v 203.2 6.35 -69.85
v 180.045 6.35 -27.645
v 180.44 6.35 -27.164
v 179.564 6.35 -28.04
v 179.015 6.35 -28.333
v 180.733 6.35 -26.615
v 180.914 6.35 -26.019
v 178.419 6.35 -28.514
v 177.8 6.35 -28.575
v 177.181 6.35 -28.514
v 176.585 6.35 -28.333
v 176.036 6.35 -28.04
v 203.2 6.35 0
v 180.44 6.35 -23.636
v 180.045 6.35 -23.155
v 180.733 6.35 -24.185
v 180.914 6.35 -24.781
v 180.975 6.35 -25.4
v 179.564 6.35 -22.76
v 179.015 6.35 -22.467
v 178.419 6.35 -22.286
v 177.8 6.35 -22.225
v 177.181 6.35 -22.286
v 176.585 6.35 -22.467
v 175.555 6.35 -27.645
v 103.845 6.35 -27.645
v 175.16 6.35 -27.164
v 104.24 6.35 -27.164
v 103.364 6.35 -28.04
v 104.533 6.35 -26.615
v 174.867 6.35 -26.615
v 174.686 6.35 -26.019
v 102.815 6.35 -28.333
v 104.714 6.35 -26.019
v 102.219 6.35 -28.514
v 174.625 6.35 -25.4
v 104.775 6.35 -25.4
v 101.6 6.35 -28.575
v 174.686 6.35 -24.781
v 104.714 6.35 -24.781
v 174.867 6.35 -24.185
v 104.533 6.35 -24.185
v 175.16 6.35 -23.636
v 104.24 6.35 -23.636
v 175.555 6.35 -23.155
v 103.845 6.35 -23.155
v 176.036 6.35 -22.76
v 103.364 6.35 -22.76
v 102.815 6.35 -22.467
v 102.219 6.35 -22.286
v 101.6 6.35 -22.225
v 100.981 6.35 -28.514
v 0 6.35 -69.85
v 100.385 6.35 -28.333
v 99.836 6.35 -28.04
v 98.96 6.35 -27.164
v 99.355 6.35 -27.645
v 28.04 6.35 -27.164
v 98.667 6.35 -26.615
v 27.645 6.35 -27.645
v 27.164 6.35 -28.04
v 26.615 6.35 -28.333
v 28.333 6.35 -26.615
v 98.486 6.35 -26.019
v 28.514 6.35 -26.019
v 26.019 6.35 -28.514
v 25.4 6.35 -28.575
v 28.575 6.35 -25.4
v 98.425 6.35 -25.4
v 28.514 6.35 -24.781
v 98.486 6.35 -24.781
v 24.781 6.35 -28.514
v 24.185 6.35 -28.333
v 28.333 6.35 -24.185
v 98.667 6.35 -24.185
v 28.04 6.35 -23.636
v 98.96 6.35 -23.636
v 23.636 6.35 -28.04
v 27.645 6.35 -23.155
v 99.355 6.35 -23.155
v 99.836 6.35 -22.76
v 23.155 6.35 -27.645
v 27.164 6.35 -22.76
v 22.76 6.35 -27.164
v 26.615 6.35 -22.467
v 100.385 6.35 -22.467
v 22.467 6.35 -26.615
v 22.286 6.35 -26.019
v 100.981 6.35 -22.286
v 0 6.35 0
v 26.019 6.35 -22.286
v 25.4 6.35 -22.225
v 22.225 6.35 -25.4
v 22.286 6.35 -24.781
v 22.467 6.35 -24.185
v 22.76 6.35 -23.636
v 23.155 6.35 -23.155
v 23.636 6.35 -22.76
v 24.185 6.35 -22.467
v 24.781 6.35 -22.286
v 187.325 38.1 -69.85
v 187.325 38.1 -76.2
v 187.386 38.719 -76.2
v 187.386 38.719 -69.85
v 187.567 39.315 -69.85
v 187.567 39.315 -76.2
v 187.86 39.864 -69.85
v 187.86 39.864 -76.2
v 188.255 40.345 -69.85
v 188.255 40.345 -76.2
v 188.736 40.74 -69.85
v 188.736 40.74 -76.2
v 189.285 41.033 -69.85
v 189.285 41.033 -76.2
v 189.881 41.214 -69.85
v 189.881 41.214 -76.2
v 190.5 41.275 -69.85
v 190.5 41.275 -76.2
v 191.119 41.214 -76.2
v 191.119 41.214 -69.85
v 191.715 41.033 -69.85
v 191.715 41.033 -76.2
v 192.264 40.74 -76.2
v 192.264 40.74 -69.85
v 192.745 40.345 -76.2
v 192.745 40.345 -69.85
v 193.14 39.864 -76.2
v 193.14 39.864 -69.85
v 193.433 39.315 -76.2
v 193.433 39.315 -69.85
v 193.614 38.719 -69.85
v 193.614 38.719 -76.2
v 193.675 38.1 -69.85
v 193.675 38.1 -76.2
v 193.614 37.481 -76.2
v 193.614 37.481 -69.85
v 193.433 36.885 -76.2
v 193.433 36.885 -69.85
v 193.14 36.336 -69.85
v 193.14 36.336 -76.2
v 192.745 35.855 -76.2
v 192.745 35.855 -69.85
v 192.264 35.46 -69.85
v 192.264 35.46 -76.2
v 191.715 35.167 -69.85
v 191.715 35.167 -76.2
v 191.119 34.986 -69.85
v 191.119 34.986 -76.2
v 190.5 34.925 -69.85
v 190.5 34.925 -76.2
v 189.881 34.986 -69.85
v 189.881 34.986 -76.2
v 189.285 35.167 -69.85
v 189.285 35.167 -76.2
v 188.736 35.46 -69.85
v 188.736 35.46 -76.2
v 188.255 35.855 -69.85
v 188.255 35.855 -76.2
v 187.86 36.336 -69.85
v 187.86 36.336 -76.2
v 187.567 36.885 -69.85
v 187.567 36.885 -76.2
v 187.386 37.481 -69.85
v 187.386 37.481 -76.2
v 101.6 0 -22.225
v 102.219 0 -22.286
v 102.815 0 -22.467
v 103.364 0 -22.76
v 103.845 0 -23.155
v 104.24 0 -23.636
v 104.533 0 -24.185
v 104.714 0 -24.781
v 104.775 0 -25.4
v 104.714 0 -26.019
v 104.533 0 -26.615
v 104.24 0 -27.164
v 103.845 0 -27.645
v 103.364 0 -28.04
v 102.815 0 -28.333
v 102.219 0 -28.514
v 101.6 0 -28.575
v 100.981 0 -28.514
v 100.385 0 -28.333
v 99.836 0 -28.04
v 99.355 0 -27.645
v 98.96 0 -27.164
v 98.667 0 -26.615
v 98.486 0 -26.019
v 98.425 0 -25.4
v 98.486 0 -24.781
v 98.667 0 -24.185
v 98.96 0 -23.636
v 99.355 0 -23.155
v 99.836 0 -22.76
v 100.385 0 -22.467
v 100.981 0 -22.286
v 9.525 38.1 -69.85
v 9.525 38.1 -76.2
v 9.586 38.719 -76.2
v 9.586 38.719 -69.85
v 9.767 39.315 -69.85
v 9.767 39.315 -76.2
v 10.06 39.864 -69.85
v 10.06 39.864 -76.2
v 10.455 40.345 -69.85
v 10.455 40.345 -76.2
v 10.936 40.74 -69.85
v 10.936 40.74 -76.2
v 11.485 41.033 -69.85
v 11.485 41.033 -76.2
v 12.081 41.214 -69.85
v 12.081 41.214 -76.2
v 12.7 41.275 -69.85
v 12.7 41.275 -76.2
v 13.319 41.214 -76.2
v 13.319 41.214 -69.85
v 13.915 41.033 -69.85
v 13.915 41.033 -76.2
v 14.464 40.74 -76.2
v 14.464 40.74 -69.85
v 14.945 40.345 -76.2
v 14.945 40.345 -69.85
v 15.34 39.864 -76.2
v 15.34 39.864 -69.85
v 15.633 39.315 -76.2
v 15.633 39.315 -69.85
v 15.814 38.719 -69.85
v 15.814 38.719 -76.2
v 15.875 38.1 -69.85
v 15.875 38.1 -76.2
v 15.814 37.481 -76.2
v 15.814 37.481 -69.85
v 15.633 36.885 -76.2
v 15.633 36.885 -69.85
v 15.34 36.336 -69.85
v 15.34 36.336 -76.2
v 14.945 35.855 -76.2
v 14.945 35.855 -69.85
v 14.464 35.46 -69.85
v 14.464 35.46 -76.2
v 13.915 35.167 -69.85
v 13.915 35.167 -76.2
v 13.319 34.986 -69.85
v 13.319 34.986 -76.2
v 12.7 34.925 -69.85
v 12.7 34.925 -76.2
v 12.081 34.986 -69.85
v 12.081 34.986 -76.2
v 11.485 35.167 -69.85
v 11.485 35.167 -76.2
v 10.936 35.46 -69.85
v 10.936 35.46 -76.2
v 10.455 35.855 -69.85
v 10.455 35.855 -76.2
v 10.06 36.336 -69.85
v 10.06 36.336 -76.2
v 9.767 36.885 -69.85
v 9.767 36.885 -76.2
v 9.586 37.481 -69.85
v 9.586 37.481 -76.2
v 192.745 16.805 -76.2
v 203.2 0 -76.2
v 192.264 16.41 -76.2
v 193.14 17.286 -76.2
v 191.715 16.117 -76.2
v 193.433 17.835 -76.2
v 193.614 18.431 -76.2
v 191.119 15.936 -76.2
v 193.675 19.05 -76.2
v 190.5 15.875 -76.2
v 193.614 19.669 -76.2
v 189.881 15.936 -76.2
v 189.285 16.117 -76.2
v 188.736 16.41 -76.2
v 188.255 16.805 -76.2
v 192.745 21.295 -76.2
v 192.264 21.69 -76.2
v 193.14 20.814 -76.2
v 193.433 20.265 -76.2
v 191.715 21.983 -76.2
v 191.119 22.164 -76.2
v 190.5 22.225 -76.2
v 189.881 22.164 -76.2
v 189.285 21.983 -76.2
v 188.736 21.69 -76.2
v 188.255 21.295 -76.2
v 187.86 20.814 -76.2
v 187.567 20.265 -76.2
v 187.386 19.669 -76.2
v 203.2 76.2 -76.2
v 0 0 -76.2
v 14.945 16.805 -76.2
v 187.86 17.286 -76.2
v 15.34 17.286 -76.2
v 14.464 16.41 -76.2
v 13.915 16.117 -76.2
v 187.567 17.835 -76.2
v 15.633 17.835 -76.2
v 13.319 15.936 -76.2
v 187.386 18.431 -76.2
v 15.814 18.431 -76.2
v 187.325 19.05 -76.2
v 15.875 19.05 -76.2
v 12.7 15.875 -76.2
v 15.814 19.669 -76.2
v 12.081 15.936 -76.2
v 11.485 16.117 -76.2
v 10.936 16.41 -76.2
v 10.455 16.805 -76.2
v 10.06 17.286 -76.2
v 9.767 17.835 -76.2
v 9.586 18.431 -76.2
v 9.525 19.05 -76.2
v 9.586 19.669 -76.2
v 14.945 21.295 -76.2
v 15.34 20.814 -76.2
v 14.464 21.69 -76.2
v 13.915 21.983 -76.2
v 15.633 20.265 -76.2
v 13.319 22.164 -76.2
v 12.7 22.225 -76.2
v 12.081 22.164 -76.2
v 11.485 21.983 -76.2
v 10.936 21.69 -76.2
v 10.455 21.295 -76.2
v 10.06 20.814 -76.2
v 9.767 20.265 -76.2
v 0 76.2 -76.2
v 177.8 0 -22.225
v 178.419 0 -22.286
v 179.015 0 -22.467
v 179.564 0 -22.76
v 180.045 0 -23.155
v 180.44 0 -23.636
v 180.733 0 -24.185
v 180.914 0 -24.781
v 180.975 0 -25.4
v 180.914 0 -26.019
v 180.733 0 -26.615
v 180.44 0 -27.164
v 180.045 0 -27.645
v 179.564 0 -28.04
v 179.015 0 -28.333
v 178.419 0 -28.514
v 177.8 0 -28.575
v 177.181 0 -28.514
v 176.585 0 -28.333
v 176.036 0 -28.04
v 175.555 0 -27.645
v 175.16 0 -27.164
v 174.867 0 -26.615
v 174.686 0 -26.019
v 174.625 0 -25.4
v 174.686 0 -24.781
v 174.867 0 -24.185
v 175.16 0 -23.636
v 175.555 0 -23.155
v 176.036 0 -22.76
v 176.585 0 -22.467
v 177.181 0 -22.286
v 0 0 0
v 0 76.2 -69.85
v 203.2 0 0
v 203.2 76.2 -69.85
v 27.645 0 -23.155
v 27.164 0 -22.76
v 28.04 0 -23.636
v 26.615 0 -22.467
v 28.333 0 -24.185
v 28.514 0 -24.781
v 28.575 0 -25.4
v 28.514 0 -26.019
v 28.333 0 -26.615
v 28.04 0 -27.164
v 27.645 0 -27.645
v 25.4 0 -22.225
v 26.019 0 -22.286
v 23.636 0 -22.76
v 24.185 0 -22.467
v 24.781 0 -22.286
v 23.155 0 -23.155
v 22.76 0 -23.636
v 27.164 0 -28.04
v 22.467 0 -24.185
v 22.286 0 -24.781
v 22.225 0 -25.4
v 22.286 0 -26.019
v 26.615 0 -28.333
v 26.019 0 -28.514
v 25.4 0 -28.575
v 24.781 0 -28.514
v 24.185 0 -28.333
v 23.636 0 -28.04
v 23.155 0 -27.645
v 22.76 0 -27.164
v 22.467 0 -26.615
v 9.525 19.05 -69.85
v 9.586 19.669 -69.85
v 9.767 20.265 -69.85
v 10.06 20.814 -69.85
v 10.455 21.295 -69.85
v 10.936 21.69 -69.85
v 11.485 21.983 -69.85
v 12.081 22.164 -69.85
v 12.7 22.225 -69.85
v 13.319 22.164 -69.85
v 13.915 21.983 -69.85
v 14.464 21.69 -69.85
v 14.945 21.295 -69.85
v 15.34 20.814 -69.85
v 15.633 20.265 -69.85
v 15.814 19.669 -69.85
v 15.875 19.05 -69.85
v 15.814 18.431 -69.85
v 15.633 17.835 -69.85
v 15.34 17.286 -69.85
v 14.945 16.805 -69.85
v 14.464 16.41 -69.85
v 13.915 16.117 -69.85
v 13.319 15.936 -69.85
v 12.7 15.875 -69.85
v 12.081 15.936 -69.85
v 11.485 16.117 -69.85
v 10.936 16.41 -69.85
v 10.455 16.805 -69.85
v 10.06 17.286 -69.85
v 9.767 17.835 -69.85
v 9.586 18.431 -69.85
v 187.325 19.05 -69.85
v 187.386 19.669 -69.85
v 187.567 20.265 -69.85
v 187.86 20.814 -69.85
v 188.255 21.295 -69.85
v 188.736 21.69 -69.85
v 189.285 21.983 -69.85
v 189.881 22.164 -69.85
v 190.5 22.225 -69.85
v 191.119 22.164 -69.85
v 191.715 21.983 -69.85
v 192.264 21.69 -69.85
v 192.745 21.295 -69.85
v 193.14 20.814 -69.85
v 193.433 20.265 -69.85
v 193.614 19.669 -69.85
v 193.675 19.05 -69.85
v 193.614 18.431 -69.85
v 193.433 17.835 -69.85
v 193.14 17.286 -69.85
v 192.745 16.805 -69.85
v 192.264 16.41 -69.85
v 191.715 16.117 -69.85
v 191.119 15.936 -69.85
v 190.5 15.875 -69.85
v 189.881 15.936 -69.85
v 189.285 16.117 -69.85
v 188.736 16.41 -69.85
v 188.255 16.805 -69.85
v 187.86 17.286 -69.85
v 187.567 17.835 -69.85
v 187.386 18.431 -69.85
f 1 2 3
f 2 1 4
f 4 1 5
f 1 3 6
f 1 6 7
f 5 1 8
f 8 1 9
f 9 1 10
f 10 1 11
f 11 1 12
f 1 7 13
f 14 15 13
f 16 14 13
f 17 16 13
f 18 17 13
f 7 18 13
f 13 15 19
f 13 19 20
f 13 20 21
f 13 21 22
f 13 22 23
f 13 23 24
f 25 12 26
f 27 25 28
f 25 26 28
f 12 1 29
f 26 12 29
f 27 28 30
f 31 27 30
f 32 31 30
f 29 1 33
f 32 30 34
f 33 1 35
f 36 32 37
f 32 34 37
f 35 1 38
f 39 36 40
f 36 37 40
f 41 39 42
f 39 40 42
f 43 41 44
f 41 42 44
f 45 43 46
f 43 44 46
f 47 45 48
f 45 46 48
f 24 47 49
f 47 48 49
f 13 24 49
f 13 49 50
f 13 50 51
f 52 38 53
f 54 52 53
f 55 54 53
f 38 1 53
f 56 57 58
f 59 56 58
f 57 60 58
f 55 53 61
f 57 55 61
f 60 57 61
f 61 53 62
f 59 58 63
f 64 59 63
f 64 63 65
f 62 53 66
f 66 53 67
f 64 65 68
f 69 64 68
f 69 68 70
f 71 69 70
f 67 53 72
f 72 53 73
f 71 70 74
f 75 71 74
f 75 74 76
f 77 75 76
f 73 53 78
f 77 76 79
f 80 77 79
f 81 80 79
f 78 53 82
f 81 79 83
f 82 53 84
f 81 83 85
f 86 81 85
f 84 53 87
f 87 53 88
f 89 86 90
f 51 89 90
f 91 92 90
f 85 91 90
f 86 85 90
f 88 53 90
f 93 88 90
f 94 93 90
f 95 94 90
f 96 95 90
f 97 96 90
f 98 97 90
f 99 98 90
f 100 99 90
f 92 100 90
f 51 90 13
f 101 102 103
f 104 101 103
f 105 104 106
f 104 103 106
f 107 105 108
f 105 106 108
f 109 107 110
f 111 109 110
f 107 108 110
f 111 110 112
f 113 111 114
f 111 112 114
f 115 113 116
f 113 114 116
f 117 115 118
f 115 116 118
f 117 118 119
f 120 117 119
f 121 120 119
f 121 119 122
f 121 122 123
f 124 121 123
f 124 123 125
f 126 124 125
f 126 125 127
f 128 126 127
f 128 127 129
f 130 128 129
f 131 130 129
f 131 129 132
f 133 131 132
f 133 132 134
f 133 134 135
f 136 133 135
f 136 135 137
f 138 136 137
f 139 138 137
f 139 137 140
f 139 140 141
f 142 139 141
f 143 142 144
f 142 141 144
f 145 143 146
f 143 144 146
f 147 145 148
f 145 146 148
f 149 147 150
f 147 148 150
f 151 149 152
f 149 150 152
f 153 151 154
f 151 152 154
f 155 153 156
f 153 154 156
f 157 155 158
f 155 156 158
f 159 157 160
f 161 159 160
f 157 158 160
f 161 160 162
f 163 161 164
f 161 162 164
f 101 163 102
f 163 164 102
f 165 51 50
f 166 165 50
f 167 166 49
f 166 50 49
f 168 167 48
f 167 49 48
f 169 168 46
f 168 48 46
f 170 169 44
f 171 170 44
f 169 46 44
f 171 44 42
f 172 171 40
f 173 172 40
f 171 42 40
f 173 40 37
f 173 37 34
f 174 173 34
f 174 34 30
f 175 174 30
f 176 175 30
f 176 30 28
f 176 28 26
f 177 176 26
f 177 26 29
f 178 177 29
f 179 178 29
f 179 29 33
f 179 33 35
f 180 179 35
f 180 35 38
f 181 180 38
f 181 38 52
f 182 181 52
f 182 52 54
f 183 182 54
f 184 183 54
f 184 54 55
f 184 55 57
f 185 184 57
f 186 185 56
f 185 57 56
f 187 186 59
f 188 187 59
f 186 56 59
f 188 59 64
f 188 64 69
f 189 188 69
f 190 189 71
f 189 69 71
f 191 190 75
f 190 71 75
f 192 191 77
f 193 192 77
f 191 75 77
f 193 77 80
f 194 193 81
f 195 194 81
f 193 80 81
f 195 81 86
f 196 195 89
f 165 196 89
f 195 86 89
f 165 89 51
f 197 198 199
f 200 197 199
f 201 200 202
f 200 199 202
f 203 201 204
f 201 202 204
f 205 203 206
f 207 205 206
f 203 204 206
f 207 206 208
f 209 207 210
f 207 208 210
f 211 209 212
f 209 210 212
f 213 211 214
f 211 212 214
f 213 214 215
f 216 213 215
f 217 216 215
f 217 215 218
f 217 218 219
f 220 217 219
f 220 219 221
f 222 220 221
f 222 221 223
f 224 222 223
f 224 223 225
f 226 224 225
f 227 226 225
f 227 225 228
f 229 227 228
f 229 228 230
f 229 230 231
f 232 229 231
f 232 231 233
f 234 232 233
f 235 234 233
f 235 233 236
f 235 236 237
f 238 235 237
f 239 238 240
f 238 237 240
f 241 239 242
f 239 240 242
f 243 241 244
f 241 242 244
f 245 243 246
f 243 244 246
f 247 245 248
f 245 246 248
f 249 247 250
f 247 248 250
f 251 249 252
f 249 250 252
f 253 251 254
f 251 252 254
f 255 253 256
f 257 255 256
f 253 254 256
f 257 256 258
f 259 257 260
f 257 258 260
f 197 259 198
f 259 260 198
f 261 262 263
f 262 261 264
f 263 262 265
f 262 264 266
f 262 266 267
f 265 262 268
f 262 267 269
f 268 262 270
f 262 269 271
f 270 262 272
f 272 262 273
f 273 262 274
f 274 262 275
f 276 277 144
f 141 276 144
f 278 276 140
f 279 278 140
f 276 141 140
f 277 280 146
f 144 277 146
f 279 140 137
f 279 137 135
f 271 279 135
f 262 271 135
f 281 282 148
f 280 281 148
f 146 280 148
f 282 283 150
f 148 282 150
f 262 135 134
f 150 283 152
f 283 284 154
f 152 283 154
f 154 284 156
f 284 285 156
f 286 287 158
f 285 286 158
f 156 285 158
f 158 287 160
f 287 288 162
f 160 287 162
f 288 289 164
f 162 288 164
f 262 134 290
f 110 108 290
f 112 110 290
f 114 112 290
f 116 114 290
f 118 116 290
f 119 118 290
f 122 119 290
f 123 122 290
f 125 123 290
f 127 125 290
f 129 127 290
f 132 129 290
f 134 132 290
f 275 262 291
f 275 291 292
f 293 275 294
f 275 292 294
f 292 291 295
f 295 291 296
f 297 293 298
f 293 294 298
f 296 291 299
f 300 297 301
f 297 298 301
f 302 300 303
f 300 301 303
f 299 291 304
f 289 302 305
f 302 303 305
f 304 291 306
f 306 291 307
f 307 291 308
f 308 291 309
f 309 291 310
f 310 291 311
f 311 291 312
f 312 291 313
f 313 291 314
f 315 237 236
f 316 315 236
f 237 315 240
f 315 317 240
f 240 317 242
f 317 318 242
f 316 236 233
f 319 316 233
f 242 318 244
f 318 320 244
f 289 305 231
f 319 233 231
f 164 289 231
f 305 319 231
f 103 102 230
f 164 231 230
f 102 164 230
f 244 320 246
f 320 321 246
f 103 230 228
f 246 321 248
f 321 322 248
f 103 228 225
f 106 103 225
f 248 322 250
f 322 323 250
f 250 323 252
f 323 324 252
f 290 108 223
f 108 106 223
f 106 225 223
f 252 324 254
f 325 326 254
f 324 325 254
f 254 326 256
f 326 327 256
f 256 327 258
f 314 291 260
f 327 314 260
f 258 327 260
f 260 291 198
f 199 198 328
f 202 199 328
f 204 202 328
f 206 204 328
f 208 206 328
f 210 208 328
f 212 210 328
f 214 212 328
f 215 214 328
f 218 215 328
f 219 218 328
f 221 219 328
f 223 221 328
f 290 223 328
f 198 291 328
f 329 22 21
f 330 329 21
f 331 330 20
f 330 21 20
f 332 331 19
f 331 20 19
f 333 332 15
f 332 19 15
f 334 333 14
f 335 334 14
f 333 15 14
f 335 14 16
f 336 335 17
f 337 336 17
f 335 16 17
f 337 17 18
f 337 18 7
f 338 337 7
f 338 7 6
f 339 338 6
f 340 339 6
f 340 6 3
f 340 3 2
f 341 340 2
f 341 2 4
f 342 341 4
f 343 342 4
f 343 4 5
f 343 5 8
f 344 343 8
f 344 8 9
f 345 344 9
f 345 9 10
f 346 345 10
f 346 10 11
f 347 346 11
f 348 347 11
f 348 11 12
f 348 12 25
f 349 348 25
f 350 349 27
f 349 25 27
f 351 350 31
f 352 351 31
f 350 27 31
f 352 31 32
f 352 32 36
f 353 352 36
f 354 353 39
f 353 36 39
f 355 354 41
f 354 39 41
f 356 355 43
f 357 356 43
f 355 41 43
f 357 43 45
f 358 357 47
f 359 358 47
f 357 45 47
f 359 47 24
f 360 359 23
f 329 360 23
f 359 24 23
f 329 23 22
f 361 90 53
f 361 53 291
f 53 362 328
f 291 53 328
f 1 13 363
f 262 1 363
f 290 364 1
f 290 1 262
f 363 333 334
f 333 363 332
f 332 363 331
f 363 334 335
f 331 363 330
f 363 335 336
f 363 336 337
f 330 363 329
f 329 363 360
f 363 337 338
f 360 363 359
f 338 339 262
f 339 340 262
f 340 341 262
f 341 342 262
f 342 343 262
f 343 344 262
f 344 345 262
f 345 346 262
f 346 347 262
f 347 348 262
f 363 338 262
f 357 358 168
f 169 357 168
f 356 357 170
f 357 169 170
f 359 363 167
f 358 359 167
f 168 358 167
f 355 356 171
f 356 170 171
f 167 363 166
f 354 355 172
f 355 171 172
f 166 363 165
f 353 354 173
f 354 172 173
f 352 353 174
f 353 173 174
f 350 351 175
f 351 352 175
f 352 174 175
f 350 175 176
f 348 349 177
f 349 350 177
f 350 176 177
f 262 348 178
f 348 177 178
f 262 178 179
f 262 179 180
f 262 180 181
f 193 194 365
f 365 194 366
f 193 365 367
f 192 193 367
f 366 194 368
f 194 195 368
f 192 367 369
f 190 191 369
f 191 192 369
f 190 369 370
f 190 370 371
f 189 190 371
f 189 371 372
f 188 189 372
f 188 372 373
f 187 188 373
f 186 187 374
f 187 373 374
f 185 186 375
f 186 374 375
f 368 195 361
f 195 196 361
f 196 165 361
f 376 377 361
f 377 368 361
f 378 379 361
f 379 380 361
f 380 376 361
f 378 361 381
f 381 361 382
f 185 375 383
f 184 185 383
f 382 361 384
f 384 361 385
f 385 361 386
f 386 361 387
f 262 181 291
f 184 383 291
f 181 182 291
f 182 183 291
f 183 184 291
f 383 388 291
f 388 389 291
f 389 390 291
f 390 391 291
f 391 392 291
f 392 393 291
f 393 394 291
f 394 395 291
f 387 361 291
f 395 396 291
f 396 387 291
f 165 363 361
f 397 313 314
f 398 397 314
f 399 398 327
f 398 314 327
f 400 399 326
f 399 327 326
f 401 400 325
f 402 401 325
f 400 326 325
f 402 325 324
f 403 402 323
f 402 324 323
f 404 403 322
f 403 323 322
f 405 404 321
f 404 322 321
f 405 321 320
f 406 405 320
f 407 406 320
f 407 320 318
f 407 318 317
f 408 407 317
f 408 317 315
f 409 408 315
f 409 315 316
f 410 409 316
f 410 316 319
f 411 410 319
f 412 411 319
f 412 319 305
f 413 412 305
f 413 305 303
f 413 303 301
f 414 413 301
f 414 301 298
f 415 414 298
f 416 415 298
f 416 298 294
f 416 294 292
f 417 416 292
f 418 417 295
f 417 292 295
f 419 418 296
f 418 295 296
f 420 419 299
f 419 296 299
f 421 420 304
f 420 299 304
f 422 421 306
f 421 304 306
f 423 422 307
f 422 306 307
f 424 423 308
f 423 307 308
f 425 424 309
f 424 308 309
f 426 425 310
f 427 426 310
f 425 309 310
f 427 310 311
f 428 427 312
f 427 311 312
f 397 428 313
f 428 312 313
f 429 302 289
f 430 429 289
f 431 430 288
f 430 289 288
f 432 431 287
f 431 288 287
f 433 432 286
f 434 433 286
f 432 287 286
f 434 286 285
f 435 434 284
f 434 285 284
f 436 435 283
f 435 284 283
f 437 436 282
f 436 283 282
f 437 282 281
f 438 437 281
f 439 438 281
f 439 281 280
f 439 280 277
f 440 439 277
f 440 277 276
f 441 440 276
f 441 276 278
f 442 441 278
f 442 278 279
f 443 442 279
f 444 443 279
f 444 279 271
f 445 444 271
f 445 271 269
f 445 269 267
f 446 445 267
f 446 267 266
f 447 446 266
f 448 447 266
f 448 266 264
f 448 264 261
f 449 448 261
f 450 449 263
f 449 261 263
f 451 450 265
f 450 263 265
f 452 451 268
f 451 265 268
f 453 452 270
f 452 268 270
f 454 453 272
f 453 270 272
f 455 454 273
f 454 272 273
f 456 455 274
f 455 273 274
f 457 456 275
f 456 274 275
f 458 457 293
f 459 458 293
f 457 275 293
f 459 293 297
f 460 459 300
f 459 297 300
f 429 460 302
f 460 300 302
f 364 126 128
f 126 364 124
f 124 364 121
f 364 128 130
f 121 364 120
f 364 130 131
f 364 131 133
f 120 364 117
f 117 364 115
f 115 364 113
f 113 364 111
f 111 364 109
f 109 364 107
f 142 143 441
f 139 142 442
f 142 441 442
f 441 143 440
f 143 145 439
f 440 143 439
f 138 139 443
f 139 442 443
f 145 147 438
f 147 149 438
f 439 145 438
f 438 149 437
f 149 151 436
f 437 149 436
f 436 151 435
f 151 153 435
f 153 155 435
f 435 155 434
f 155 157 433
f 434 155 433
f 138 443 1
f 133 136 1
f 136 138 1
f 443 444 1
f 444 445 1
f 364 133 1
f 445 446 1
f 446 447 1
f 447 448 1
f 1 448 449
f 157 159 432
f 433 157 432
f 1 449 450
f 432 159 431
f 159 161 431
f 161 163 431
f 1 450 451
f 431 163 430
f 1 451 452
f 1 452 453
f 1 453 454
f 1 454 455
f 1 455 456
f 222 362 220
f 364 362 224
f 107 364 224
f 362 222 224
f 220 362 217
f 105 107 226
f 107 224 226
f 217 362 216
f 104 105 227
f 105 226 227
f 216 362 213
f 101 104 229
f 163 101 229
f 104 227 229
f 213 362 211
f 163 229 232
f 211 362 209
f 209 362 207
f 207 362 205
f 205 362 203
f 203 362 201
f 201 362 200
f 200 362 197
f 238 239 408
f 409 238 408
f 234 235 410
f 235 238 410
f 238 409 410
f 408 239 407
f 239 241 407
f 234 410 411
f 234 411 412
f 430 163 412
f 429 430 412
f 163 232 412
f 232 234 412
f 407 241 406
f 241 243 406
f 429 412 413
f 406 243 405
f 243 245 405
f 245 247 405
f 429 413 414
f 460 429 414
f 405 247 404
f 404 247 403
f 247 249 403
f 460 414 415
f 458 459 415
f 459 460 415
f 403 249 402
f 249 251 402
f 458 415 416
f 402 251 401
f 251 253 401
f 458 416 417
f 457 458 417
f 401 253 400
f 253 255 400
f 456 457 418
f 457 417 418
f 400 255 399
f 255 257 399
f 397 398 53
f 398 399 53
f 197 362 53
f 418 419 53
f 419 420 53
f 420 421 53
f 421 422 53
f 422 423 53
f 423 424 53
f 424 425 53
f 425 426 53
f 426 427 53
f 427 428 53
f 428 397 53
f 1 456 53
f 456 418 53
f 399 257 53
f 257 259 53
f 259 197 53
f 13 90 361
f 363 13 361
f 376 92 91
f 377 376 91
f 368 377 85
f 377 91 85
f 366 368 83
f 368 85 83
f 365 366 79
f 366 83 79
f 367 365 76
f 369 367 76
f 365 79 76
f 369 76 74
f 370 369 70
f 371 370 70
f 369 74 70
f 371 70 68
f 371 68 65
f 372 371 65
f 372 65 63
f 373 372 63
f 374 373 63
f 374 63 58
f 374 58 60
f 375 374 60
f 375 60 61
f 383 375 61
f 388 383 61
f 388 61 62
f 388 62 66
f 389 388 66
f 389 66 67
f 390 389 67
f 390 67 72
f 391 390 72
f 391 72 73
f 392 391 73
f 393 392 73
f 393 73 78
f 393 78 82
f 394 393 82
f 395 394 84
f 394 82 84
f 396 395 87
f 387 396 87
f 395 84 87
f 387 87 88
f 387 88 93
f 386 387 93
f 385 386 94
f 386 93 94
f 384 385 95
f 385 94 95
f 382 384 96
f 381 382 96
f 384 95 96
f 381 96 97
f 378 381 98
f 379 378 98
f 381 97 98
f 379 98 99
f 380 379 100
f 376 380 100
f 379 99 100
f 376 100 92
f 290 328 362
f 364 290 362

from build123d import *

# Parameters (mm, degrees)
BOSS_EXTRUDE2_DEPTH = 203.2
SKETCH4_R           = 3.175
CUT_EXTRUDE1_DEPTH  = 71.628
SKETCH5_R           = 3.175
CUT_EXTRUDE2_DEPTH  = 244.602


with BuildPart() as part:
    # Sketch2 → Boss-Extrude2 (new body)
    with BuildSketch(Plane(origin=(0, 0, 0), x_dir=(0, 0, -1), z_dir=(1, 0, 0))):
        Polygon((0, 6.35), (0, 0), (76.2, 0), (76.2, 76.2), (69.85, 76.2), (69.85, 6.35), align=None)
    extrude(amount=BOSS_EXTRUDE2_DEPTH)

    # Sketch4 → Cut-Extrude1 (cut)
    with BuildSketch(Plane(origin=(0, 0, -76.2), x_dir=(-1, 0, 0), z_dir=(0, 0, -1))):
        with Locations((-190.5, 19.05)):
            Circle(SKETCH4_R)
        with Locations((-190.5, 38.1)):
            Circle(SKETCH4_R)
        with Locations((-12.7, 19.05)):
            Circle(SKETCH4_R)
        with Locations((-12.7, 38.1)):
            Circle(SKETCH4_R)
    extrude(amount=-CUT_EXTRUDE1_DEPTH, mode=Mode.SUBTRACT)

    # Sketch5 → Cut-Extrude2 (cut)
    with BuildSketch(Plane(origin=(0, 6.35, 0), x_dir=(1, 0, 0), z_dir=(0, 1, 0))):
        with Locations(Location((25.4, 25.4, 0), (0, 0, 270))):
            Circle(SKETCH5_R)
        with Locations(Location((177.8, 25.4, 0), (0, 0, 270))):
            Circle(SKETCH5_R)
        with Locations(Location((101.6, 25.4, 0), (0, 0, 270))):
            Circle(SKETCH5_R)
    extrude(amount=-CUT_EXTRUDE2_DEPTH, mode=Mode.SUBTRACT)


solid = part.part
